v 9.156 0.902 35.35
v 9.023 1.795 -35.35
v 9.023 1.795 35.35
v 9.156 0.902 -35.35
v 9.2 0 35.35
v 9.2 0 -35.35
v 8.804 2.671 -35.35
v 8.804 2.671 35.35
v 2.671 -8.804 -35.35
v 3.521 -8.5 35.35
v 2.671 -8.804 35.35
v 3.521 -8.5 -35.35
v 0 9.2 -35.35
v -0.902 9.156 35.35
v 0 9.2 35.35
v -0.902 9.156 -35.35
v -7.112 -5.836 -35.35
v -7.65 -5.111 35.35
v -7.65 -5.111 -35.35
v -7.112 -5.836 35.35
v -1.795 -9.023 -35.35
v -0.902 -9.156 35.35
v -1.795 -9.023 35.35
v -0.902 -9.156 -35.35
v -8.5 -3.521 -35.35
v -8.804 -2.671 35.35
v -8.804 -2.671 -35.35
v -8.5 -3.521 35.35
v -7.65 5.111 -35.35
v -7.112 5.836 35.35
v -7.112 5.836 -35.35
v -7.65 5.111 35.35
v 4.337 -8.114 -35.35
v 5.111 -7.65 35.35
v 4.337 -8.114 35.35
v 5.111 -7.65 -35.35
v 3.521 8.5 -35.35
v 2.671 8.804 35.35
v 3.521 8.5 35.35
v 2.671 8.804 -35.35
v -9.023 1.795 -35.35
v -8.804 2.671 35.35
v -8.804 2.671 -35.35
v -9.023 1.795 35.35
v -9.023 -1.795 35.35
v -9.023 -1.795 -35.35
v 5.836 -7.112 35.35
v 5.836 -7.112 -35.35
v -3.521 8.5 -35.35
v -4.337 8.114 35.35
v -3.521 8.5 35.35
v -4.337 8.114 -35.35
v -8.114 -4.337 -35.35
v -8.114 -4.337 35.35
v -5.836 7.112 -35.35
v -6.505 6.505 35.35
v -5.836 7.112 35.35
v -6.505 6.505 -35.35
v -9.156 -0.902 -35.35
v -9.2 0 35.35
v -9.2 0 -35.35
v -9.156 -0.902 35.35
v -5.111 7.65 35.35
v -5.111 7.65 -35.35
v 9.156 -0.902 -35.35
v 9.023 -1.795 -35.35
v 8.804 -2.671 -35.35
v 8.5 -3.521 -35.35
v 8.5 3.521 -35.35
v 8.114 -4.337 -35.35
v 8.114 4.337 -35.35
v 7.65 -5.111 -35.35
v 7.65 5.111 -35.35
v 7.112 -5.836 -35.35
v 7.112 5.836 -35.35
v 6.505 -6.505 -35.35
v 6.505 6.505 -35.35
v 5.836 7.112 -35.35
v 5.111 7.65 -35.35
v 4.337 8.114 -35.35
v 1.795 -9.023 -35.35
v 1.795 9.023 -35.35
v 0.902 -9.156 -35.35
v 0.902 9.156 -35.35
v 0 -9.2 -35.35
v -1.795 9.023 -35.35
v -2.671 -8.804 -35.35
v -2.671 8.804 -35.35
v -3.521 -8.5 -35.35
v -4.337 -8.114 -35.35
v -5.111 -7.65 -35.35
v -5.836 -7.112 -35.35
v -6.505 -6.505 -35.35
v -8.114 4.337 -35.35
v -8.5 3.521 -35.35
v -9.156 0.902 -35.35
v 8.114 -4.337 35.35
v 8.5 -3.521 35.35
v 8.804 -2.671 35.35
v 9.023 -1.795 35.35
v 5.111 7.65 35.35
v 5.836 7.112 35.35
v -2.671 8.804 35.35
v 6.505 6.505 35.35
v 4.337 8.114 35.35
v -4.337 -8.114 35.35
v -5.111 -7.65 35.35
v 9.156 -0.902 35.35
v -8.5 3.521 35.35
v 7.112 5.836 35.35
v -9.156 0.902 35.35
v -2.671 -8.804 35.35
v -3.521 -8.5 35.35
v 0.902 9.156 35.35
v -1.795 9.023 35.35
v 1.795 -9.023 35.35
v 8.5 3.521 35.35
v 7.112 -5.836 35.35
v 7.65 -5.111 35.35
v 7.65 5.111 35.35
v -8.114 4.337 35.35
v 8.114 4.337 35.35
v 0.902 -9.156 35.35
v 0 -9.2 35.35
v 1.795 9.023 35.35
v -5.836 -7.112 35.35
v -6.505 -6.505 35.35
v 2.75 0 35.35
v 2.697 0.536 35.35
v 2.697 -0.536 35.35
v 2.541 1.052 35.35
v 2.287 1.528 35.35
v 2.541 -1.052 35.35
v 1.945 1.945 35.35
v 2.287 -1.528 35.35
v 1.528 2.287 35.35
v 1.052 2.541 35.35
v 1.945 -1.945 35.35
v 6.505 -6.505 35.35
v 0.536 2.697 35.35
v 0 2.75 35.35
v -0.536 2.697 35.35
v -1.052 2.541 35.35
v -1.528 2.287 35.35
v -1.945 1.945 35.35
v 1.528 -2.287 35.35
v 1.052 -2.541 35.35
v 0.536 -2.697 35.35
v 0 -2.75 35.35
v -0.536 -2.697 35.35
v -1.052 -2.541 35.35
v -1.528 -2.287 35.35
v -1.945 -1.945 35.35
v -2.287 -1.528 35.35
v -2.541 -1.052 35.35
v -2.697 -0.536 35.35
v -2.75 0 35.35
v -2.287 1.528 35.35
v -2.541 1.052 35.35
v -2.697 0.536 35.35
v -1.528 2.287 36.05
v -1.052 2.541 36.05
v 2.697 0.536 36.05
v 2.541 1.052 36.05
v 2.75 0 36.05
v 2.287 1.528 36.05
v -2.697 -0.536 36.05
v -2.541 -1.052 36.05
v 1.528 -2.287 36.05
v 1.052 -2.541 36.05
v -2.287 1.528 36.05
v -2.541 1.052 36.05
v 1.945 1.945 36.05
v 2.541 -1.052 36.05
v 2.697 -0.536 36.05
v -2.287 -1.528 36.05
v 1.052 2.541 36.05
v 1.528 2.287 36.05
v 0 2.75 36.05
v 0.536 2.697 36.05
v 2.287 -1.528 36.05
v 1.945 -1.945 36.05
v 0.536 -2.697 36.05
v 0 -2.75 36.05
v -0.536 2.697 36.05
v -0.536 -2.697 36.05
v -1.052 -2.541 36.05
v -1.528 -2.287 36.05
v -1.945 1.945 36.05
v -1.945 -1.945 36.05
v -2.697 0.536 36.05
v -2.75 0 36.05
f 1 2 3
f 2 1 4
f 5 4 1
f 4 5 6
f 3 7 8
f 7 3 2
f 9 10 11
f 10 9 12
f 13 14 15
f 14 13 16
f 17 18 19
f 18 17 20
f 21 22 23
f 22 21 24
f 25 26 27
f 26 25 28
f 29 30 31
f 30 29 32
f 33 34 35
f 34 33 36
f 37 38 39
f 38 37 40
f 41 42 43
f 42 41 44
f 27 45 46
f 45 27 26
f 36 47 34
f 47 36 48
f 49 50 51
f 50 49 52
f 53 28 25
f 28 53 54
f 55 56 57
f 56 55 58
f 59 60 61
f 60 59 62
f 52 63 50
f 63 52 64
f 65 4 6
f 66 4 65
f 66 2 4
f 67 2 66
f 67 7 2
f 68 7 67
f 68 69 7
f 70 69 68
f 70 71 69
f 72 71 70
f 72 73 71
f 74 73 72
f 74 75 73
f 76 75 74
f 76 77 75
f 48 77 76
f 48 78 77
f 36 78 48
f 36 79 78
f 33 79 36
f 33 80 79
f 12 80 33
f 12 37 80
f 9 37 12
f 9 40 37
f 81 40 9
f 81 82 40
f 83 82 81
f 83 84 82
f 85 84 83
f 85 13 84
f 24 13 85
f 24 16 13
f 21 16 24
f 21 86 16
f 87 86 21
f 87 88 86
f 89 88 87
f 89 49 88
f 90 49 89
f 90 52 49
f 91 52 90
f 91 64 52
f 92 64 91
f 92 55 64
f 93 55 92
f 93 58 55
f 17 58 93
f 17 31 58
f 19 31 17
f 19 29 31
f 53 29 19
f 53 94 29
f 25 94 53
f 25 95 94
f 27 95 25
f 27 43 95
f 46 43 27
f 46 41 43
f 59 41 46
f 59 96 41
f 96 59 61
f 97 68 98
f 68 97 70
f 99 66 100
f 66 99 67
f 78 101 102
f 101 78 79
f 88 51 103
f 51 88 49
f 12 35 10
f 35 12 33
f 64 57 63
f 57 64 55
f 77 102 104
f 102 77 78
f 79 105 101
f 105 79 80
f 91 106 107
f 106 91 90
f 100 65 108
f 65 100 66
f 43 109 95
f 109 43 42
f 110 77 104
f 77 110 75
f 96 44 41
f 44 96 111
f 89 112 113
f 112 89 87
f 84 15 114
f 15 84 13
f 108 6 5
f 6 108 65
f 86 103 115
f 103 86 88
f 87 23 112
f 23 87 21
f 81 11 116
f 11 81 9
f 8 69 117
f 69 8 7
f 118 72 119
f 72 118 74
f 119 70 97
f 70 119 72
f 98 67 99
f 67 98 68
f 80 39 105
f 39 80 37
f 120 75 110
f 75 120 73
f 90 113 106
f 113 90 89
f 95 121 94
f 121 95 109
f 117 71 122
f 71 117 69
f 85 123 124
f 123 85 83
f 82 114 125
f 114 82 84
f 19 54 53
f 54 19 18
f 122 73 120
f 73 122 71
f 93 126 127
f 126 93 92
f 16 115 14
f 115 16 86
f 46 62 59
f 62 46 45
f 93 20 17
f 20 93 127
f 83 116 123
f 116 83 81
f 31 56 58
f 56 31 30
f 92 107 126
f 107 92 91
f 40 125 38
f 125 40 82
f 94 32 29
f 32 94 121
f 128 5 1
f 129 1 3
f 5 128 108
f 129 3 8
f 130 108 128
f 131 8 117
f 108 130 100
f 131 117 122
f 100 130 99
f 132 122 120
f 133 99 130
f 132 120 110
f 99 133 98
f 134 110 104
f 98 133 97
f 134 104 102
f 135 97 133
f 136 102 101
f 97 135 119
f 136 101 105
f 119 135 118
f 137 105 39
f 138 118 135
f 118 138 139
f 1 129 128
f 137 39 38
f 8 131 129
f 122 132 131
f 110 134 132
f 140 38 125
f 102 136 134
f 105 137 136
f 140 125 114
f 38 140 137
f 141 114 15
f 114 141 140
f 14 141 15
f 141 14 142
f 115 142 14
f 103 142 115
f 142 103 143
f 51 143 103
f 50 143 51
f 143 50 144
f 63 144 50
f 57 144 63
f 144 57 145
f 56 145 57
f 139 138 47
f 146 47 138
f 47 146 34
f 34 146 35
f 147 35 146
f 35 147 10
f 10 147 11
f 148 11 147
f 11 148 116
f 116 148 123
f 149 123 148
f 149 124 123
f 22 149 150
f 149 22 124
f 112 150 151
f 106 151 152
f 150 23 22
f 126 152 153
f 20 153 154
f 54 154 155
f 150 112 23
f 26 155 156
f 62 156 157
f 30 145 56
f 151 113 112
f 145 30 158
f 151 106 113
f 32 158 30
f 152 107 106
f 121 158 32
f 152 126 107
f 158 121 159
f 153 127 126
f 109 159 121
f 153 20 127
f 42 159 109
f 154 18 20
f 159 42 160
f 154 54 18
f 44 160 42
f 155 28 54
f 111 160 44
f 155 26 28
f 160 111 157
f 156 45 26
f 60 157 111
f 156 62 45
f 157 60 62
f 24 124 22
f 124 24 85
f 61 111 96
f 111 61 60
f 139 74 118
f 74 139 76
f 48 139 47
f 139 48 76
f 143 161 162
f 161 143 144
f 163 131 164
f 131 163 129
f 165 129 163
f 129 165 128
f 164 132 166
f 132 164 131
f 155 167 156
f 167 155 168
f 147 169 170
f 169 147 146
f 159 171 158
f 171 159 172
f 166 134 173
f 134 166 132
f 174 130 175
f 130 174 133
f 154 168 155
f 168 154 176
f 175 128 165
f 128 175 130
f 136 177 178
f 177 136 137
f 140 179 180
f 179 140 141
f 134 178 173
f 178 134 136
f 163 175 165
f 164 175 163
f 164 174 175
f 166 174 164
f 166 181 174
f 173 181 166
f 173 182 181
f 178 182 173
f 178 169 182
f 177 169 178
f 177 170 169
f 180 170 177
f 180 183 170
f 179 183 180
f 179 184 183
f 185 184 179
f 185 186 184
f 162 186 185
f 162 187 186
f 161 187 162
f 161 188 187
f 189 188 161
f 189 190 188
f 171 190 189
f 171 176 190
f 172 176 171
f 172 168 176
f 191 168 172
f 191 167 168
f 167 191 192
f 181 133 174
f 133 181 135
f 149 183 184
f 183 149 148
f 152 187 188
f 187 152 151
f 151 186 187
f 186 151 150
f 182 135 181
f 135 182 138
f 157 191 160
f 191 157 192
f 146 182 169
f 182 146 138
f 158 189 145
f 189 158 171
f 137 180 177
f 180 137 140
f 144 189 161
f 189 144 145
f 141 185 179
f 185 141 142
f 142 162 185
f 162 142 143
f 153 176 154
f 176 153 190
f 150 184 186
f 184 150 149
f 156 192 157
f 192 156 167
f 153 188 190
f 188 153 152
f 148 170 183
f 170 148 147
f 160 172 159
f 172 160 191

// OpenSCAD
// Parameters
height_mm = 70.7; //[35.35:141.4:0.1]
diameter_mm = 18.4; //[9.2:36.8:0.1]
positive_terminal_diameter_mm = 5.5; //[2.75:11:0.1]
positive_terminal_height_mm = 1.5; //[0.75:3:0.1]
negative_terminal_diameter_mm = 10; //[5:20:0.1]
negative_terminal_height_mm = 0.2; //[0.1:0.4:0.05]
overlap_mm = 0.8; //[0.5:2:0.1]

// Battery - complete geometry
module battery() {
  union() {
    // Cylindrical cell body
    color("Silver") {
      translate([0, 0, 0])
        cylinder(h=height_mm, r=diameter_mm/2, center=true, $fn=64);
    }
    // Positive terminal button
    color("Gold") {
      translate([0, 0, height_mm/2 + positive_terminal_height_mm/2 - overlap_mm])
        cylinder(h=positive_terminal_height_mm, r=positive_terminal_diameter_mm/2, center=true, $fn=32);
    }
    // Negative terminal contact
    color("Copper") {
      translate([0, 0, -height_mm/2 - negative_terminal_height_mm/2 + overlap_mm])
        cylinder(h=negative_terminal_height_mm, r=negative_terminal_diameter_mm/2, center=true, $fn=32);
    }
  }
}

// Assembly
module assembly() {
  battery();
}

assembly();
